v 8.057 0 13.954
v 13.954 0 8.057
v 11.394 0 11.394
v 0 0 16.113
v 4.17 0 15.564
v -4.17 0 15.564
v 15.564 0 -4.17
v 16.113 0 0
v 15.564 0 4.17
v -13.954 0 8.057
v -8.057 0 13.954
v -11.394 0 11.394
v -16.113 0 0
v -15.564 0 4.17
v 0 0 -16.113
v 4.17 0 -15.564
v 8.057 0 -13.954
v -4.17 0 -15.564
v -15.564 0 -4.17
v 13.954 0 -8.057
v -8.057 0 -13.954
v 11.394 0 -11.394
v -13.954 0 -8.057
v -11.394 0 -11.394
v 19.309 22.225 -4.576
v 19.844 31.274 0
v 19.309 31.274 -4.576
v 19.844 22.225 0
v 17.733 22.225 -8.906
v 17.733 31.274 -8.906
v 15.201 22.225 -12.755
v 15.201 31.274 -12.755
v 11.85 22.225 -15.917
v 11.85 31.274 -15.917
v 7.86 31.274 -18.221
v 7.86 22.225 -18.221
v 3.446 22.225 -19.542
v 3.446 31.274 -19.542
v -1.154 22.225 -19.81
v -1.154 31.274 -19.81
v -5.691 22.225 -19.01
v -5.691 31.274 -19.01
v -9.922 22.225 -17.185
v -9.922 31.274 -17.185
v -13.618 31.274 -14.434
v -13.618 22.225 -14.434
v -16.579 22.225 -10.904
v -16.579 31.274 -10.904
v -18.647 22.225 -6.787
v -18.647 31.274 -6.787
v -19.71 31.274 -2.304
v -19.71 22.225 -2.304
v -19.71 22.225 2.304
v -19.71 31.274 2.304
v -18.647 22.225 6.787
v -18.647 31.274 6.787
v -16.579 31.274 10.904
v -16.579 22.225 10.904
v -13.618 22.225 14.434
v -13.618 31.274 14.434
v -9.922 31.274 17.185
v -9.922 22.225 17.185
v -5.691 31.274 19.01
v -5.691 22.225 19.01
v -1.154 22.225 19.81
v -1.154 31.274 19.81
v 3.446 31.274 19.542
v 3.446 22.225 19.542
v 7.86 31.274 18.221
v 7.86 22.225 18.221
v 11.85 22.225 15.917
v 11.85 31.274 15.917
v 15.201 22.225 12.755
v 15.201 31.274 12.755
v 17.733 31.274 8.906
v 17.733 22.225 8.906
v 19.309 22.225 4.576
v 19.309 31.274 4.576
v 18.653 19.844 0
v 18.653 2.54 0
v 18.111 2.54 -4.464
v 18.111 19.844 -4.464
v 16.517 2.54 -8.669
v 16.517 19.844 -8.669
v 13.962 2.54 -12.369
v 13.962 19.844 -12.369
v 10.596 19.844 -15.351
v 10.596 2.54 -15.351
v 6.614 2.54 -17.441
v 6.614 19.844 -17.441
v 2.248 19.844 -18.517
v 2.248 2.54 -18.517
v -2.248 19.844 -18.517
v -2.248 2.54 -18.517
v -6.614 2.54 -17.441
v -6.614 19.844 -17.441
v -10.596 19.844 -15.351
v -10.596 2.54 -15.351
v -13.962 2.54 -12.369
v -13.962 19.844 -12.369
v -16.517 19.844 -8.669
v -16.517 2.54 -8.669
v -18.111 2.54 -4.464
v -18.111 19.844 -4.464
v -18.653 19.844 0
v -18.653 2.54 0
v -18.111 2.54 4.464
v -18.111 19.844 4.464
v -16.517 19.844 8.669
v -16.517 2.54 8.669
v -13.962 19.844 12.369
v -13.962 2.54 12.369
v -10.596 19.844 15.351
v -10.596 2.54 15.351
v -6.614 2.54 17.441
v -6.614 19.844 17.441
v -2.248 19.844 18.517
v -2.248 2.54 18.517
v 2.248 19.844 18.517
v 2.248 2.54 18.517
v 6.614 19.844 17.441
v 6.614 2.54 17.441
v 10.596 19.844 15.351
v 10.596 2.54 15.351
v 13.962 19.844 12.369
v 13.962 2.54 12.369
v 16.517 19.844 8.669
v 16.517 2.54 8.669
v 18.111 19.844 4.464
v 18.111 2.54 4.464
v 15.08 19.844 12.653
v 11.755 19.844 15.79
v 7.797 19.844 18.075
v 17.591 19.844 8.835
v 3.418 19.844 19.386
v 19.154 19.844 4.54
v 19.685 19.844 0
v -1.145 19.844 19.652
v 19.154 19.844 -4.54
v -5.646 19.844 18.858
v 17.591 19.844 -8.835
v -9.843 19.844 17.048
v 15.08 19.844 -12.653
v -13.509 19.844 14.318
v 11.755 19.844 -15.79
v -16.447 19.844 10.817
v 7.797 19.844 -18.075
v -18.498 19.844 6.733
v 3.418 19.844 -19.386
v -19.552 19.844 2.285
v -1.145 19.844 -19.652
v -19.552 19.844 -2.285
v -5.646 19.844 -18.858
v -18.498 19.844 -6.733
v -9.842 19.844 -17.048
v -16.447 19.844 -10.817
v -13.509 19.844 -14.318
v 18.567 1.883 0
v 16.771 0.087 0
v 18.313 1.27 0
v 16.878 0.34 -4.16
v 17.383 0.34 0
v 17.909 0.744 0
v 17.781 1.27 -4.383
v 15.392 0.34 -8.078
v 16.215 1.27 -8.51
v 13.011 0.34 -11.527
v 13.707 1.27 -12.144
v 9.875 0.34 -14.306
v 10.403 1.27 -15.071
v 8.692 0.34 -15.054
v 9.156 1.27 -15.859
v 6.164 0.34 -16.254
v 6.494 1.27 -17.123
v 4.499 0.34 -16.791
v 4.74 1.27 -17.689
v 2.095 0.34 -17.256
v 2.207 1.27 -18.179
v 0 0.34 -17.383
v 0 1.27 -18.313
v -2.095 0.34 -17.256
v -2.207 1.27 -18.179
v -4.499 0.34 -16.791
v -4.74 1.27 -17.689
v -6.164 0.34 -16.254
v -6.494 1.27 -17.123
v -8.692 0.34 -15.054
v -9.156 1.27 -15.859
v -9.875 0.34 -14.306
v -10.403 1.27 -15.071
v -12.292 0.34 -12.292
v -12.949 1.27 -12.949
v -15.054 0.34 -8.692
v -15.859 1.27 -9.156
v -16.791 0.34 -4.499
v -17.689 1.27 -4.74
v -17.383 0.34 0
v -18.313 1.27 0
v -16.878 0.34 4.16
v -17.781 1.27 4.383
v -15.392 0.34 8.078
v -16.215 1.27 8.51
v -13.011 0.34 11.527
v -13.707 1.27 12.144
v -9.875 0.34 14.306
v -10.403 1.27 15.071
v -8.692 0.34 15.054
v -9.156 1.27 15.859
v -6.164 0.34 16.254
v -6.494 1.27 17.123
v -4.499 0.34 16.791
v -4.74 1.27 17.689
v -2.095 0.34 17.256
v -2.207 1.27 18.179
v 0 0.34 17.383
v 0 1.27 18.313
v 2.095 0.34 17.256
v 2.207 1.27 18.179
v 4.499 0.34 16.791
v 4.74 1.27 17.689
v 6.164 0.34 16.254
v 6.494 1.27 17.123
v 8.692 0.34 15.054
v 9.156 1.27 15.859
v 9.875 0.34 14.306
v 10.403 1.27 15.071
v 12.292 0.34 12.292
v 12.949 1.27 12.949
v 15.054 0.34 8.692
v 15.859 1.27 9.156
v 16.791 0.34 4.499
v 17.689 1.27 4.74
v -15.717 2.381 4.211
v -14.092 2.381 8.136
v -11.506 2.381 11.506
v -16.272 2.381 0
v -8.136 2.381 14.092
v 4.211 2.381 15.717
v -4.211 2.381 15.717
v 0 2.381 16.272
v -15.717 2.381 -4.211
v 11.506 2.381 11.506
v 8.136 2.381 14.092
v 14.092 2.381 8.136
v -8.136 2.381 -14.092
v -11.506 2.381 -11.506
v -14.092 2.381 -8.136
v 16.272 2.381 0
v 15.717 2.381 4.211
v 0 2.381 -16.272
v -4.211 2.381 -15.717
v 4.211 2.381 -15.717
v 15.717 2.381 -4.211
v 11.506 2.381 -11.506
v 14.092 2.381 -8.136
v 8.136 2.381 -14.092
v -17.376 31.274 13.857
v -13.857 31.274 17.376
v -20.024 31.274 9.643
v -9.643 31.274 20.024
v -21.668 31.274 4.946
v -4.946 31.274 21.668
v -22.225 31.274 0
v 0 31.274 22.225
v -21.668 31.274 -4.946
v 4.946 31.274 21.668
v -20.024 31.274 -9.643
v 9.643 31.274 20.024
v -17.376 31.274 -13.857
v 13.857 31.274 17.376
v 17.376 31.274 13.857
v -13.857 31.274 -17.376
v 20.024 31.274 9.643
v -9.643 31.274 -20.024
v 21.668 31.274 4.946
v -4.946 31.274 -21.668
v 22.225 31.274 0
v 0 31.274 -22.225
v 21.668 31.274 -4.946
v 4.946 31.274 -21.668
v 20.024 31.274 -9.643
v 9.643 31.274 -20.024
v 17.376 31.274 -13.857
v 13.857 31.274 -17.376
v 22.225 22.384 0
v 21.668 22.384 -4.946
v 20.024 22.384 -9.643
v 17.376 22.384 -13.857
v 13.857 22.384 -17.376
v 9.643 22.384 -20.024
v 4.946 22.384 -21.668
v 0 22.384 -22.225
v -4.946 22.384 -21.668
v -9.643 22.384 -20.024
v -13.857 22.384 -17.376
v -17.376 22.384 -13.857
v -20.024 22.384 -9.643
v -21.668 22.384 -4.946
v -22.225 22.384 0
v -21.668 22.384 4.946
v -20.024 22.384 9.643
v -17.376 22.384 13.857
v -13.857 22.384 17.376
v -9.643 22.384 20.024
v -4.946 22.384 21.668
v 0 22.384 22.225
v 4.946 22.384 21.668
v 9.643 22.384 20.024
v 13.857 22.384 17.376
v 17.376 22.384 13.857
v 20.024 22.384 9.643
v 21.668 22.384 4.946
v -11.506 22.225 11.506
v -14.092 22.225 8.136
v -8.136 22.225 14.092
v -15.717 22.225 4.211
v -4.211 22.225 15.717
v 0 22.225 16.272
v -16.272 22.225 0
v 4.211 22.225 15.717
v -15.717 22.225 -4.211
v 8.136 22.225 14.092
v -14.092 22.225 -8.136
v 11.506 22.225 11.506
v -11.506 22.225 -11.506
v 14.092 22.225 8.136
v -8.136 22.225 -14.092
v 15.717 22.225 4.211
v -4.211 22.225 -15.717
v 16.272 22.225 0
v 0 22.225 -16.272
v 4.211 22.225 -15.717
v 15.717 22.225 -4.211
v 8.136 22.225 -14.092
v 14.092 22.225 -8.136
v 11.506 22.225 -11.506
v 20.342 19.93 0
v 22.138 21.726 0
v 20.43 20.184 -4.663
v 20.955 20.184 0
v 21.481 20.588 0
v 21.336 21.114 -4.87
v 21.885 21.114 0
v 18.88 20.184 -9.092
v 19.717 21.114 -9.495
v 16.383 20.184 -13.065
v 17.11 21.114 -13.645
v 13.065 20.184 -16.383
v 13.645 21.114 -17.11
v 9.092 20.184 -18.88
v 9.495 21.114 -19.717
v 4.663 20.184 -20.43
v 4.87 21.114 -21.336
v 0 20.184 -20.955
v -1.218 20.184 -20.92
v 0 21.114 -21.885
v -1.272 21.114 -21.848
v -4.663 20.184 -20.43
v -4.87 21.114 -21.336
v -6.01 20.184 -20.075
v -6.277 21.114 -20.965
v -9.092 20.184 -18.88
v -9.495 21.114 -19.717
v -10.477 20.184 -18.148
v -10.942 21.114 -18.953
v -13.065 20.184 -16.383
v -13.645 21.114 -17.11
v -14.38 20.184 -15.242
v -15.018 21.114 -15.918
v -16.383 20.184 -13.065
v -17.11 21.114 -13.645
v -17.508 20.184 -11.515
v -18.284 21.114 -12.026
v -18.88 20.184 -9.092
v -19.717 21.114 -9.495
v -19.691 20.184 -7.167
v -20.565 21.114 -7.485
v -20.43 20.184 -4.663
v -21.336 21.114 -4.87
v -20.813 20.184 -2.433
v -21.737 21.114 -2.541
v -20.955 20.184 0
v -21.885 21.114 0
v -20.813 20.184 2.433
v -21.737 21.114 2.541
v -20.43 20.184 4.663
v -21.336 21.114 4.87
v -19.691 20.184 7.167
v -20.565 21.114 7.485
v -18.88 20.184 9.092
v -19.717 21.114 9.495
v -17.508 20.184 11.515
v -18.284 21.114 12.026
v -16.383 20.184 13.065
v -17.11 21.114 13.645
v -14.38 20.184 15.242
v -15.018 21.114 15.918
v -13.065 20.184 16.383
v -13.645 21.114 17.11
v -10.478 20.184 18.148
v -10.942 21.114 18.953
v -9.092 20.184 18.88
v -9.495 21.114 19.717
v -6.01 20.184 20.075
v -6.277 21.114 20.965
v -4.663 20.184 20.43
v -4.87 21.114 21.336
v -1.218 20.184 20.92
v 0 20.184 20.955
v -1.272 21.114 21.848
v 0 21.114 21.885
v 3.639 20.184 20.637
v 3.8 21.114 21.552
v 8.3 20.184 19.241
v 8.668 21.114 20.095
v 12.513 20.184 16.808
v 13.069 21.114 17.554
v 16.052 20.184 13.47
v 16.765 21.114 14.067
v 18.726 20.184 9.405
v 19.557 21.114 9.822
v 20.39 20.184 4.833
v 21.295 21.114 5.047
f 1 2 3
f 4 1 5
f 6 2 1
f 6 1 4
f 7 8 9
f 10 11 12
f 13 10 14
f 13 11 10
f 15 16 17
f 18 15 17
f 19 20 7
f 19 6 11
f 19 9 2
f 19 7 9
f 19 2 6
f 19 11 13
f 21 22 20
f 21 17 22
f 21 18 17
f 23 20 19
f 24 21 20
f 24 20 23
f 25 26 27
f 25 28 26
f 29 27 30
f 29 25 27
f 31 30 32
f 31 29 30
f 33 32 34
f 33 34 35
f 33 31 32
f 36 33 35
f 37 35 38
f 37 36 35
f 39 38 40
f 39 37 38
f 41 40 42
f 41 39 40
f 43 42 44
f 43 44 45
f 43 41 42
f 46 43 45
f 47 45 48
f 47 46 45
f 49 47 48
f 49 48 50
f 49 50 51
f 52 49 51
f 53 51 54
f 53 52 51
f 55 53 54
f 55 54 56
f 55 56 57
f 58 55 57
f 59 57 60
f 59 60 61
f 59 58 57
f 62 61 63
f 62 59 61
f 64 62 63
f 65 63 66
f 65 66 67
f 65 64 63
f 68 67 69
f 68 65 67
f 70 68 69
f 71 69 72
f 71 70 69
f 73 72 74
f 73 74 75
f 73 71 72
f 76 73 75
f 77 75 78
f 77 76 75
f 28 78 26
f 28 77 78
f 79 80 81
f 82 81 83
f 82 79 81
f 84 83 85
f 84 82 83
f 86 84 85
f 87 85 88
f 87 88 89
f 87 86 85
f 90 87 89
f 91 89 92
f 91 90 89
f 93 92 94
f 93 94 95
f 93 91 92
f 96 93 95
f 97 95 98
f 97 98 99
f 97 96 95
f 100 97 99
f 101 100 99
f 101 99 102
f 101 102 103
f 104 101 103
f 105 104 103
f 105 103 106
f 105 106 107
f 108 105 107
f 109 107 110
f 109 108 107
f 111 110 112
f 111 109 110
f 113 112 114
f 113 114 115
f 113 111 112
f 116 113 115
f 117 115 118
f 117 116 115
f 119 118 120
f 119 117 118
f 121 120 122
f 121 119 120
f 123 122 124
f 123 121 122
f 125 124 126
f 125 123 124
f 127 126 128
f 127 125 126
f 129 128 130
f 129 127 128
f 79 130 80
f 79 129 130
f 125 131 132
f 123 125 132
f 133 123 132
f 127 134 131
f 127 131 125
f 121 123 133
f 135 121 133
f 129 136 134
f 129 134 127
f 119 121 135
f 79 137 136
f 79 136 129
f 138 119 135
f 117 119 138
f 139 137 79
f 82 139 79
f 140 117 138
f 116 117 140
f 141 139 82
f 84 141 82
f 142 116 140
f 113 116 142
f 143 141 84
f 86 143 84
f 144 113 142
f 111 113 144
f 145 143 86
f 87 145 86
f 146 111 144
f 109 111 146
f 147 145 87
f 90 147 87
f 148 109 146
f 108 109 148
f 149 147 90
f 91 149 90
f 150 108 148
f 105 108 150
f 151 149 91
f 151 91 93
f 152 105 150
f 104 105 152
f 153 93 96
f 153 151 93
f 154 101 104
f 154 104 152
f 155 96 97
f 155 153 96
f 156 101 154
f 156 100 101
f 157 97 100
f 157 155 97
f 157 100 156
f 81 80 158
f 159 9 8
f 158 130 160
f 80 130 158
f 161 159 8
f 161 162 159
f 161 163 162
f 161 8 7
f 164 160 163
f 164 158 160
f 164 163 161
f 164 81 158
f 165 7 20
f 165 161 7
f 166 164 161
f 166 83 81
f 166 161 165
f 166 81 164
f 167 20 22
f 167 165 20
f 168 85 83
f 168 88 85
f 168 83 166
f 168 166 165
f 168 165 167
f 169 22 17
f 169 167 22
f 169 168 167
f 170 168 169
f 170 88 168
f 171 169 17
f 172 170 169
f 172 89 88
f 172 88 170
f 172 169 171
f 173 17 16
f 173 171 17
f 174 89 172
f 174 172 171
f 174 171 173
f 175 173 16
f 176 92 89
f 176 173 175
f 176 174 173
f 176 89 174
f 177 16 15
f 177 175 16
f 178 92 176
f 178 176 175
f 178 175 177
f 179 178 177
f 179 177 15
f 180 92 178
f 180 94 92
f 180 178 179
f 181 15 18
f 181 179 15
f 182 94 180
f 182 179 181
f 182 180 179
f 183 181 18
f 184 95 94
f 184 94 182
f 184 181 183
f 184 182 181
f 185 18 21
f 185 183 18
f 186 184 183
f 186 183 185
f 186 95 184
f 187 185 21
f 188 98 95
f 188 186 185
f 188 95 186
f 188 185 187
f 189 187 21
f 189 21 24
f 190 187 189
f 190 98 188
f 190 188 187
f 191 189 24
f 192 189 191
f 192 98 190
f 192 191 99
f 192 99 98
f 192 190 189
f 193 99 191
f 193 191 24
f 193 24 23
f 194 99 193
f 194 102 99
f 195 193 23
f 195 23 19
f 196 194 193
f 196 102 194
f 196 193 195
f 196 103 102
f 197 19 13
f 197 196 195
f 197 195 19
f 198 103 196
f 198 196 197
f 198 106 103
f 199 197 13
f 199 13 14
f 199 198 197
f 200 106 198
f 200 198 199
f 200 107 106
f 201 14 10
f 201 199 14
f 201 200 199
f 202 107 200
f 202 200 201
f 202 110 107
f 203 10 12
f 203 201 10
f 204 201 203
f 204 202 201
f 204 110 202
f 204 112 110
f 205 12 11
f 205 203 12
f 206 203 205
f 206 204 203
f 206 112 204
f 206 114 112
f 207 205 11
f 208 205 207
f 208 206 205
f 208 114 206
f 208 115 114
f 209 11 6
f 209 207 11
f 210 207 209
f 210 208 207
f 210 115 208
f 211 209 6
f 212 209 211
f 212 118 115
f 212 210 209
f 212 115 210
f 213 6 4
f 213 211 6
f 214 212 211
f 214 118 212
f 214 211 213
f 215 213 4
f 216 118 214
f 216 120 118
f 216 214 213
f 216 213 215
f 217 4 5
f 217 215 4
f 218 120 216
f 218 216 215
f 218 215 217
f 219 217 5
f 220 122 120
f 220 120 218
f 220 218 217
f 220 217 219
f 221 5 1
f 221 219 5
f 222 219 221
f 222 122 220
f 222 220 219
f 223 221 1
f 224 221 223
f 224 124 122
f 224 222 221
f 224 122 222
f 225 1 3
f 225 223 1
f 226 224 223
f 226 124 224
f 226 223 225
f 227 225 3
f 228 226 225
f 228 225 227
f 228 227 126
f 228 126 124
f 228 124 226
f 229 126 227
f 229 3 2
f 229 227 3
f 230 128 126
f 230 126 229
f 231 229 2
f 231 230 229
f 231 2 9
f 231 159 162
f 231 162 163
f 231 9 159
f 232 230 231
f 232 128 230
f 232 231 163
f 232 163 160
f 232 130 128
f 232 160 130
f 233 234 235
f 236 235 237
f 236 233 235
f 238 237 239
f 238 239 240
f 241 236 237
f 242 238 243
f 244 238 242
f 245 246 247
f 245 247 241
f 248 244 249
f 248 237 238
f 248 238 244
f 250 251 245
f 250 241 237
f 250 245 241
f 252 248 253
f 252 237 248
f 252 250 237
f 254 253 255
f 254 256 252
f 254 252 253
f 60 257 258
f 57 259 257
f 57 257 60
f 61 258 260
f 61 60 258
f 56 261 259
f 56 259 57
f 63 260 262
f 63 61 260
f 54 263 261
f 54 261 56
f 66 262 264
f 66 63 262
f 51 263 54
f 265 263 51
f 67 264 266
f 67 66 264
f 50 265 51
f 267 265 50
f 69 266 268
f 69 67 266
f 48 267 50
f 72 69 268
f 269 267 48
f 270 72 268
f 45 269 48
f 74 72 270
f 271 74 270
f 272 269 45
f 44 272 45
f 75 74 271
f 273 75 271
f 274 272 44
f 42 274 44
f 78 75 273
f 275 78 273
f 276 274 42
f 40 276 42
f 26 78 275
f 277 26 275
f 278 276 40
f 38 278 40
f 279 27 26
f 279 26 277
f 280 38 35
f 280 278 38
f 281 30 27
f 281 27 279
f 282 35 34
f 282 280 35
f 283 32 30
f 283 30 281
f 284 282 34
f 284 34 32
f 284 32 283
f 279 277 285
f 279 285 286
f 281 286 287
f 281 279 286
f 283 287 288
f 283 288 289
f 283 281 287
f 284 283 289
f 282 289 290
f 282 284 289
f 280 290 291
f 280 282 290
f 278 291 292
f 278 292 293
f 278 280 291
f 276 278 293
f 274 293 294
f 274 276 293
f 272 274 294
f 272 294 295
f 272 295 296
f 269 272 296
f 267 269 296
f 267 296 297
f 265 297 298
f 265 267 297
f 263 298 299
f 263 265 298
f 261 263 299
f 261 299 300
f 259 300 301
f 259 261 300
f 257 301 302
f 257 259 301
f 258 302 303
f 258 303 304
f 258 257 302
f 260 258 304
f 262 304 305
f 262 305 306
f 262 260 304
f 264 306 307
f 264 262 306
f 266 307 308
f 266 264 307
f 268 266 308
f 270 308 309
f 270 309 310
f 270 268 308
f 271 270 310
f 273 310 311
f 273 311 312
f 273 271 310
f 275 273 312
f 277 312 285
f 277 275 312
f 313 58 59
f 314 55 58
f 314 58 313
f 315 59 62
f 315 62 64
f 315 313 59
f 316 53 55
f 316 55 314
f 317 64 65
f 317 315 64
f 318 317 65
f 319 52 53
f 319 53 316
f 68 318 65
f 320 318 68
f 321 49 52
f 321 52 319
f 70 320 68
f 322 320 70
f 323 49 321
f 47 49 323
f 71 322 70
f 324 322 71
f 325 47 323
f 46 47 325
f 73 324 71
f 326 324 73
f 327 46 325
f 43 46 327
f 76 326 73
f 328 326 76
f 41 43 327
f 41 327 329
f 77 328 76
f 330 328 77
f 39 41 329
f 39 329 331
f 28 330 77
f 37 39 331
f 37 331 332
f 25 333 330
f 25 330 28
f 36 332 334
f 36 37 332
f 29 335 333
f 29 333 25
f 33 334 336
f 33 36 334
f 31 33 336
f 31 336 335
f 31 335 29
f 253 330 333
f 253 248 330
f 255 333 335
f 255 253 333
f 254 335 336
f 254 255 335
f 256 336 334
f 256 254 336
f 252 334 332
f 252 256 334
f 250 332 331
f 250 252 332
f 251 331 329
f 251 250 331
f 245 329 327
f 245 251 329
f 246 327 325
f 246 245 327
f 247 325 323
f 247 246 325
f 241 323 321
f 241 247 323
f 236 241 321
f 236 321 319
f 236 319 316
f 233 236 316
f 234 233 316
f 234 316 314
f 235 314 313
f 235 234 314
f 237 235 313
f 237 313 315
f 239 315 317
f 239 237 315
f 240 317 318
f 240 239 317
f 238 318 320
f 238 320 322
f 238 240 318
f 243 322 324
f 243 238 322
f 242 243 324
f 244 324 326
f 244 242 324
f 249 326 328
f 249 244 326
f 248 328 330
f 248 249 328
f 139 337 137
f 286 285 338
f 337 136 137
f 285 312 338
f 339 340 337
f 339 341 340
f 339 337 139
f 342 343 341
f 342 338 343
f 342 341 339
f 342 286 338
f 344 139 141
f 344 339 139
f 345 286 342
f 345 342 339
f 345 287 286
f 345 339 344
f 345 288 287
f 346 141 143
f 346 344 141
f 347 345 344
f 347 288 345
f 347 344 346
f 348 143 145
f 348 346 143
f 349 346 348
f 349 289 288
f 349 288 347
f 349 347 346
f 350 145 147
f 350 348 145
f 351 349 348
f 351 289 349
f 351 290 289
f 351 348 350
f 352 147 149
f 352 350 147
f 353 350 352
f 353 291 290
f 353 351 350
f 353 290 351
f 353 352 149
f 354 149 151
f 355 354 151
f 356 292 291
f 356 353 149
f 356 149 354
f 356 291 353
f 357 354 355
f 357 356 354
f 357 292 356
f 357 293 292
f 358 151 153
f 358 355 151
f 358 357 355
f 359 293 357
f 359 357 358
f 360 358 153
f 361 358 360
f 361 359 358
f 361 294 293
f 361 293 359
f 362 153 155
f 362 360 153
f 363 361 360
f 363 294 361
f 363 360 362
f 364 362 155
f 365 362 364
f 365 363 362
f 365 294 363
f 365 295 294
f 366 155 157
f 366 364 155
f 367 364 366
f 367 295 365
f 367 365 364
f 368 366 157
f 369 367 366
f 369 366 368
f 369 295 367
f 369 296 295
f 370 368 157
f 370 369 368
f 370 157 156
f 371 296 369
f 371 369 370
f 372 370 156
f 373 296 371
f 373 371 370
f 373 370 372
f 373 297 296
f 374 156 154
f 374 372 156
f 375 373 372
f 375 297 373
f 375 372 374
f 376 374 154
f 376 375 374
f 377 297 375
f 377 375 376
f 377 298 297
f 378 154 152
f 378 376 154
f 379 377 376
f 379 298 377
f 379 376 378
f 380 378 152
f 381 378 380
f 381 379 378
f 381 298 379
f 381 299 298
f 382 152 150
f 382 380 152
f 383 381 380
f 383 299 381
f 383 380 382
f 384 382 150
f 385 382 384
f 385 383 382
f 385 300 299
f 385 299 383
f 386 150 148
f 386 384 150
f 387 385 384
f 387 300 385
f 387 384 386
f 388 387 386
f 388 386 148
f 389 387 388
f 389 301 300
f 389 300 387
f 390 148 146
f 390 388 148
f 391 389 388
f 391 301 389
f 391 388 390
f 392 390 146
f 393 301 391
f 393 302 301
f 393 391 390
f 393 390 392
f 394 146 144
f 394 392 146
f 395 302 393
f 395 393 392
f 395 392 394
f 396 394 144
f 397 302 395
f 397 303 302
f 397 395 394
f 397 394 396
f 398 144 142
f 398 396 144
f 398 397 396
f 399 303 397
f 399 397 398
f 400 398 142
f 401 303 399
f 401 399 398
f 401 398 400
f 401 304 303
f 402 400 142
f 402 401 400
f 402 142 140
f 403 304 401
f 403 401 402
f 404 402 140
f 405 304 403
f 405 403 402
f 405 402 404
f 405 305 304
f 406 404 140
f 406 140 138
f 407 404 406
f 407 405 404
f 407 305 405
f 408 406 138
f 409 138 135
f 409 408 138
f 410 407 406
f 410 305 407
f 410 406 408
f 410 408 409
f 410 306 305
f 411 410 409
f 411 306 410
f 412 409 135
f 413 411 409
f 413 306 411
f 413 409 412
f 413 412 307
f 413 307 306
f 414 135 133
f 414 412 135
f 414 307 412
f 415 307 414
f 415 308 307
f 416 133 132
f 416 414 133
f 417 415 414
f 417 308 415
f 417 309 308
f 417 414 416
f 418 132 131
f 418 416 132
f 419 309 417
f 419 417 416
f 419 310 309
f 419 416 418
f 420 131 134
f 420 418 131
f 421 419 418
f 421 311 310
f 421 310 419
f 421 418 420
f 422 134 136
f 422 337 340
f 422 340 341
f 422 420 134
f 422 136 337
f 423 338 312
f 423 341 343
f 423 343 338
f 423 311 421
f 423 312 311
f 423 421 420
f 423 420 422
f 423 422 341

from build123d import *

# Parameters (mm, degrees)
FILLET1_R = 2.54


with BuildPart() as part:
    # Sketch2 → Revolve1 (revolve)
    with BuildSketch(Plane.XY):
        Polygon((0, 0), (18.653125, 0), (18.653125, 19.84375), (22.225, 19.84375), (22.225, 31.27375), (19.84375, 31.27375), (19.84375, 22.225), (16.271875, 22.225), (16.271875, 2.38125), (0, 2.38125), align=None)
    revolve(axis=Axis((0, 0, 0), (0, 1, 0)))

    # Fillet1
    fillet1_edges = [part.edges().sort_by_distance(p)[0] for p in [
        (-18.653125, 0, 0),
        (-22.225, 19.84375, 0),
    ]]
    fillet(fillet1_edges, radius=FILLET1_R)


solid = part.part
